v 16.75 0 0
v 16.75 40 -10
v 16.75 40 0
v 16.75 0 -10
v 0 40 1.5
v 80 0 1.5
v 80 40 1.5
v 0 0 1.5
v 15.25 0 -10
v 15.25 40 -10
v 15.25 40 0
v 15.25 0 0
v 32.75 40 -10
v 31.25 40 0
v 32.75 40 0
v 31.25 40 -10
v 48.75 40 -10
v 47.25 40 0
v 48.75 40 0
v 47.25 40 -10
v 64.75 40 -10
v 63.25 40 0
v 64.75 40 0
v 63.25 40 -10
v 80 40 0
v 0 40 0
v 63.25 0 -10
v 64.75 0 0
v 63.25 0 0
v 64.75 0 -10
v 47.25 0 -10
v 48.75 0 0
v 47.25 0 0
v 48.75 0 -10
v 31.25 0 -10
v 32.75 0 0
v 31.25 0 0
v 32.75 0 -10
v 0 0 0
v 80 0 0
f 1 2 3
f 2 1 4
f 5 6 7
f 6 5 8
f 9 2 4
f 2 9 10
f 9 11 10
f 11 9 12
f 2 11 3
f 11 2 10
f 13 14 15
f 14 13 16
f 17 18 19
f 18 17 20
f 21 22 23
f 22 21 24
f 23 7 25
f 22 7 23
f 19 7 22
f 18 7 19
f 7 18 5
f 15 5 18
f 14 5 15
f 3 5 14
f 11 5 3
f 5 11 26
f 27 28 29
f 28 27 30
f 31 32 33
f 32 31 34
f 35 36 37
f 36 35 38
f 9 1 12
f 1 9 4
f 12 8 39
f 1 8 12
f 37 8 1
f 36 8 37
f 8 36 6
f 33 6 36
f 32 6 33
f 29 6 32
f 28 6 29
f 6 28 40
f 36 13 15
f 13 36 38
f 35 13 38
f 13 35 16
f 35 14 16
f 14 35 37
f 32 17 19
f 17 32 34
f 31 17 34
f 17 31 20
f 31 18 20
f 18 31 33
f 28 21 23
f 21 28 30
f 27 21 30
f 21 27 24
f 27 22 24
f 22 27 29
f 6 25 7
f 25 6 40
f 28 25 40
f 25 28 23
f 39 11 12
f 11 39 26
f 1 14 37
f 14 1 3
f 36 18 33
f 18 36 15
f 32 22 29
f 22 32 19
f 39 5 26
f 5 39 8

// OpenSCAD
$fn = 32;

// ----------------------------------------------------------------------
// Ribbed panel: 1.5 mm panel
// ----------------------------------------------------------------------

// --- parameters (mm) ---
panel_l = 80;             // panel length, X
panel_w = 40;             // panel width, Y
panel_t = 1.5;            // panel thickness, Z
rib_t = 1.5;              // rib thickness
rib_h = 10;               // rib height below the panel
ribs = 4;                 // number of ribs

total_h = panel_t + rib_h;  // overall height

union() {
  cube([panel_l, panel_w, panel_t]);
  for (i = [1 : ribs])
    translate([i * panel_l / (ribs + 1) - rib_t / 2, 0, -rib_h])
      cube([rib_t, panel_w, rib_h + panel_t]);
}
